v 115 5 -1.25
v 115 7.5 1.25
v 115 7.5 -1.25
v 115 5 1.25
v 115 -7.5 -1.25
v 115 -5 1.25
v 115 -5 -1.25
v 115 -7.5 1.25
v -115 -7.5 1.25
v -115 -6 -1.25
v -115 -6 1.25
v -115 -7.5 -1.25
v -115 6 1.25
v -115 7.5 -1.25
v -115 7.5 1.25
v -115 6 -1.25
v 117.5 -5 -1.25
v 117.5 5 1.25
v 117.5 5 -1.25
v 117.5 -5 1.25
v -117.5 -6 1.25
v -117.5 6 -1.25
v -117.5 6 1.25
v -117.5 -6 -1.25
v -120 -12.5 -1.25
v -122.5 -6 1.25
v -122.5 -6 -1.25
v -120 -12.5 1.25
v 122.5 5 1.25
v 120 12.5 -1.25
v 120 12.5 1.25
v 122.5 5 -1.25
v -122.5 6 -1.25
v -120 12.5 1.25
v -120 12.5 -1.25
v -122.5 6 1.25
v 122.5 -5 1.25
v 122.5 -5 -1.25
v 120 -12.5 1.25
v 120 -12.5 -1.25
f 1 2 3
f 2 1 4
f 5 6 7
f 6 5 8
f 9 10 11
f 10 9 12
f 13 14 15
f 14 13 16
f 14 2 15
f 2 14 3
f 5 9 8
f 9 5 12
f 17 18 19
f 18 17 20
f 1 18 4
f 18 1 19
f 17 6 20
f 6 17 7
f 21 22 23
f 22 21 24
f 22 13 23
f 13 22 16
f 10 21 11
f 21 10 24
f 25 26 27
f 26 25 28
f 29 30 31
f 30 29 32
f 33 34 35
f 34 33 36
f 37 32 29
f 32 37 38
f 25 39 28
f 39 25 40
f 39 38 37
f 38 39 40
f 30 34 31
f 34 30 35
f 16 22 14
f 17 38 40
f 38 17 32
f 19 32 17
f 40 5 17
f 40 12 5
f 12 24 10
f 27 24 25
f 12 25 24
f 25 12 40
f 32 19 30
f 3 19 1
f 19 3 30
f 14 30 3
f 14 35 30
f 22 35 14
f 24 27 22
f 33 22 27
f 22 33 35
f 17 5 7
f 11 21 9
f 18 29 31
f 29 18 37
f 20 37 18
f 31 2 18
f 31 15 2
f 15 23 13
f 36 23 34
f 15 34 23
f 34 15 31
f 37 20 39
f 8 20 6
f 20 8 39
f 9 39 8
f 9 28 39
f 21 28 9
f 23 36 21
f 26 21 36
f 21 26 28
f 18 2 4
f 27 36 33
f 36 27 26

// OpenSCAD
width = 25;
length = 240;
height = 2.5;
hookWidth = 10;
hookExtraSpace = 10;
thickness = 5;

//math
innerLength = length-thickness*2;
innerWidth = width-thickness*2;
hookExtraLength = hookExtraSpace/2;

module mainForm(l, w, h, hw, hel) {
  hull() {
    cube(size=[l, w, h], center=true);
    translate([l/2, 0, 0]) {
      cube(size=[hel, hw, h], center=true);
    }
    translate([-l/2, 0, 0]) {
      cube(size=[hel, hw+2, h], center=true);
    }
  }
}

module innerForm(l, w, h, hw, hel) {
  cube(size=[l, w, h+2], center=true);
  translate([l/2, 0, 0]) {
    cube(size=[hel, hw, h+2], center=true);
  }
  translate([-l/2, 0, 0]) {
    cube(size=[hel, hw+2, h+2], center=true);
  }
}

difference() {
  mainForm(length, width, height, hookWidth, hookExtraLength);
  innerForm(innerLength, innerWidth, height, hookWidth, hookExtraLength);
}
